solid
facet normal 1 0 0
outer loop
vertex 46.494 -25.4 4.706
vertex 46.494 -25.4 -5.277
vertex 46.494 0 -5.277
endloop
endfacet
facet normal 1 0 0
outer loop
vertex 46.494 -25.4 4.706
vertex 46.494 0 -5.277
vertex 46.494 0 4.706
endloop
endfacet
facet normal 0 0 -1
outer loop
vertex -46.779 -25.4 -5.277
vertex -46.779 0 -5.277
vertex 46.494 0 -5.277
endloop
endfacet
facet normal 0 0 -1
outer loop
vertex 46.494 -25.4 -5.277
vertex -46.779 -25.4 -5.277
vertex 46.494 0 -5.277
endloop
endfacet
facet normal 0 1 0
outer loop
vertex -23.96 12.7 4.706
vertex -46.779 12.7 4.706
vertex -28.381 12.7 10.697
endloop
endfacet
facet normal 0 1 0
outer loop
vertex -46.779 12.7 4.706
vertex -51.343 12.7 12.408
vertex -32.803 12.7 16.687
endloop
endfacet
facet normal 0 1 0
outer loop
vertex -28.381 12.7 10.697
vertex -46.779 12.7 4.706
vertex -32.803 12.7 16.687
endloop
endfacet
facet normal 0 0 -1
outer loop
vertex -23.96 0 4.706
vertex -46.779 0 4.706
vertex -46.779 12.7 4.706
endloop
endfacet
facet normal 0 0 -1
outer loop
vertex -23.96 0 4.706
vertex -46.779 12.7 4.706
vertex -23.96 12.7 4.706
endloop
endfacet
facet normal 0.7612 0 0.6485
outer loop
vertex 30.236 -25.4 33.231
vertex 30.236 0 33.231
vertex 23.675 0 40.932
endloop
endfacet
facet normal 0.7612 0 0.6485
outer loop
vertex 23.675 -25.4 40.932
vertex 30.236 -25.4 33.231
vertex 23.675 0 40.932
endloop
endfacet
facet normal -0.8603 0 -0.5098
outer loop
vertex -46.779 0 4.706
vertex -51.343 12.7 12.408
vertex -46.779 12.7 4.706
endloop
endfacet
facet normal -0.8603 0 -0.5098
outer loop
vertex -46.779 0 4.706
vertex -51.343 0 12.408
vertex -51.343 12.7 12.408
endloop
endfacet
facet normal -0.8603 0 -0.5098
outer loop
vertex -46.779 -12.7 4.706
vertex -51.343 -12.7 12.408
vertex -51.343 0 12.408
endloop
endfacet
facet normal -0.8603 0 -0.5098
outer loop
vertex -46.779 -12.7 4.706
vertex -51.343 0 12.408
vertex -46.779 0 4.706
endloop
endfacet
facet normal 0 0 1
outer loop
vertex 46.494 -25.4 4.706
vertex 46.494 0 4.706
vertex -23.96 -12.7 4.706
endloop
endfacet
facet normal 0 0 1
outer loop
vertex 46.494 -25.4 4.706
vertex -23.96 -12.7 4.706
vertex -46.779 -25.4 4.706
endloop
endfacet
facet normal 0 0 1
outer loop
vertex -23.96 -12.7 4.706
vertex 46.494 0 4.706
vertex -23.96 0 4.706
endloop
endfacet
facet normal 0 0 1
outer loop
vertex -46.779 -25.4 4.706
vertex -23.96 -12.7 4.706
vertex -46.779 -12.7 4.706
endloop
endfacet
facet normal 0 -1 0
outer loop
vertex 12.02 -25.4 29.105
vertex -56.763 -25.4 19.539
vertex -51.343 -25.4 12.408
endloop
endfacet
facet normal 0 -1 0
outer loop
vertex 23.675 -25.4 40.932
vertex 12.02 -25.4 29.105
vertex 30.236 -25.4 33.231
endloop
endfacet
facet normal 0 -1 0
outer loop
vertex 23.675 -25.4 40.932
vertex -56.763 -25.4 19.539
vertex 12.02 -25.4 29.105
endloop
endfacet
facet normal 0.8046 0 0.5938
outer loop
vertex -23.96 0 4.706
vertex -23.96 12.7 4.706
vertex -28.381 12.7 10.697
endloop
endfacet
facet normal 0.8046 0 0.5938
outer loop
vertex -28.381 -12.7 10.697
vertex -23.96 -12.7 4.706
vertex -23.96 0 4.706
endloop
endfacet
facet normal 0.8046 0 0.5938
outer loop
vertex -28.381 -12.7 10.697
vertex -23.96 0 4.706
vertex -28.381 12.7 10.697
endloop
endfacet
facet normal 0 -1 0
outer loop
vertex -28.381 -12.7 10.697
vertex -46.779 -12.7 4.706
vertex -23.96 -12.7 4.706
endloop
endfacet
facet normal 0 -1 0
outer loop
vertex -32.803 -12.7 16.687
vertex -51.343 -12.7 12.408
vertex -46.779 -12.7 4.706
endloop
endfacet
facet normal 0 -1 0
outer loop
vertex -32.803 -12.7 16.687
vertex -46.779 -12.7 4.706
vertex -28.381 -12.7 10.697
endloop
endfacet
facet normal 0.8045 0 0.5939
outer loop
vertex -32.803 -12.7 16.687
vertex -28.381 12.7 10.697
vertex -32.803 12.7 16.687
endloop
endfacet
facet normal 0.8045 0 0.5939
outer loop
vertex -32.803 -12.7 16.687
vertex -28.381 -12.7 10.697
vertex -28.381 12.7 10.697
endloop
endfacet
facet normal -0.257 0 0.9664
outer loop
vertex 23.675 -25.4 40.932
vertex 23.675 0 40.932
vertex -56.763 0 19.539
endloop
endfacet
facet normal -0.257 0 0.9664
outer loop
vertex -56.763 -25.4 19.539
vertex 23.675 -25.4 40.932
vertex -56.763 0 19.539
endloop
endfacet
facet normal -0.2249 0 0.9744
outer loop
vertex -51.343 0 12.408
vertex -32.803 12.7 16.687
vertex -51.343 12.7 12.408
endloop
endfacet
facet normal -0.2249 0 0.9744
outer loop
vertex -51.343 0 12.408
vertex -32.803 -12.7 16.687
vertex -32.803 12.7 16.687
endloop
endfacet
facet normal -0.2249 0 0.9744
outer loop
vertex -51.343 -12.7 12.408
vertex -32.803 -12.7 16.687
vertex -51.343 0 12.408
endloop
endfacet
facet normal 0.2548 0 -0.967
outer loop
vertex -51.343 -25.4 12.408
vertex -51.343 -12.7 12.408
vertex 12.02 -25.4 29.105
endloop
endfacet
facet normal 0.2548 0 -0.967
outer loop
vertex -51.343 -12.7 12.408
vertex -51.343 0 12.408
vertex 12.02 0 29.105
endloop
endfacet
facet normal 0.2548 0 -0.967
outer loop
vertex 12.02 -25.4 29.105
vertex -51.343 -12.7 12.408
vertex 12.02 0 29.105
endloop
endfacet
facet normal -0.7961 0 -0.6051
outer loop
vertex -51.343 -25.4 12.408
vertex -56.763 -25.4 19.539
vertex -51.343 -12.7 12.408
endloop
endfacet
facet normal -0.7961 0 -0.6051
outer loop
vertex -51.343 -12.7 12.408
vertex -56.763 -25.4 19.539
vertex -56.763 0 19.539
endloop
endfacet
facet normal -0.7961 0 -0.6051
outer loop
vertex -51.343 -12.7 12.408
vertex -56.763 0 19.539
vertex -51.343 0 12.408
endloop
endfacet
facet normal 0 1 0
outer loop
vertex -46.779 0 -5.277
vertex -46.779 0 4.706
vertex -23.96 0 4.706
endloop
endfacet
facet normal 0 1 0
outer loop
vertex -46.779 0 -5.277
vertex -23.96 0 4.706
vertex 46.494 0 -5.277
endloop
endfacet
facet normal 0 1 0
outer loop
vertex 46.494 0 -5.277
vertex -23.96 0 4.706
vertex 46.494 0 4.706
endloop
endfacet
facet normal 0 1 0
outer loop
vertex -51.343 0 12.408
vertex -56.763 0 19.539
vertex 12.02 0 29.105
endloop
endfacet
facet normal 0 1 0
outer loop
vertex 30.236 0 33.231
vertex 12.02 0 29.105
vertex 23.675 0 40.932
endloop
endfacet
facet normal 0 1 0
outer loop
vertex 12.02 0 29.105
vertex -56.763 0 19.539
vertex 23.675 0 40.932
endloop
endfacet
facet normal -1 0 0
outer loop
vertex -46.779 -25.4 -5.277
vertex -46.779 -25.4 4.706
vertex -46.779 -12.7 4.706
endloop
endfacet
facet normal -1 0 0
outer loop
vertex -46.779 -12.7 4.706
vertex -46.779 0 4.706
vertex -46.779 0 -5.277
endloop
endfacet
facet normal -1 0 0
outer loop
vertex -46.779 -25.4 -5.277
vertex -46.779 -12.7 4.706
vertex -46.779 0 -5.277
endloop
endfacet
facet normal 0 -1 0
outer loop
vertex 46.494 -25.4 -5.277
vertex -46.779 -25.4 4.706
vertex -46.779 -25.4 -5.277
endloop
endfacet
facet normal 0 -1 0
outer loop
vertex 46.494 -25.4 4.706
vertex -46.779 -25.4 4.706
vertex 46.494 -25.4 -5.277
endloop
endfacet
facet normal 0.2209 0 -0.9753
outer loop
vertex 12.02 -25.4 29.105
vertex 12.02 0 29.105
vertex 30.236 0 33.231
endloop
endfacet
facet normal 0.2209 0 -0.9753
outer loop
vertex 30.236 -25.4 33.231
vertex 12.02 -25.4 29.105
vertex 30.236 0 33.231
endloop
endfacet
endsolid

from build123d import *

# Parameters (mm, degrees)
F1_DEPTH = 25.4
F2_DEPTH = 12.7


with BuildPart() as f1:
    # F0 (on Front) → F1 (new body)
    with BuildSketch(Plane.XZ):
        Polygon((-56.762889, 19.538984), (-51.343314, 12.407968), (12.019784, 29.10491), (30.23551, 33.230536), (23.674972, 40.932029), align=None)
        Polygon((-23.960212, 4.706471), (-46.779465, 4.706471), (-46.779465, -5.276952), (46.494223, -5.276952), (46.494223, 4.706471), align=None)
    extrude(amount=F1_DEPTH)

    # F0 (on Front) → F2 (join, symmetric)
    with BuildSketch(Plane.XZ):
        Polygon((-51.343314, 12.407968), (-46.779465, 4.706471), (-23.960212, 4.706471), (-28.381444, 10.696524), (-32.802675, 16.686577), align=None)
    extrude(amount=F2_DEPTH, both=True)


solid = f1.part
